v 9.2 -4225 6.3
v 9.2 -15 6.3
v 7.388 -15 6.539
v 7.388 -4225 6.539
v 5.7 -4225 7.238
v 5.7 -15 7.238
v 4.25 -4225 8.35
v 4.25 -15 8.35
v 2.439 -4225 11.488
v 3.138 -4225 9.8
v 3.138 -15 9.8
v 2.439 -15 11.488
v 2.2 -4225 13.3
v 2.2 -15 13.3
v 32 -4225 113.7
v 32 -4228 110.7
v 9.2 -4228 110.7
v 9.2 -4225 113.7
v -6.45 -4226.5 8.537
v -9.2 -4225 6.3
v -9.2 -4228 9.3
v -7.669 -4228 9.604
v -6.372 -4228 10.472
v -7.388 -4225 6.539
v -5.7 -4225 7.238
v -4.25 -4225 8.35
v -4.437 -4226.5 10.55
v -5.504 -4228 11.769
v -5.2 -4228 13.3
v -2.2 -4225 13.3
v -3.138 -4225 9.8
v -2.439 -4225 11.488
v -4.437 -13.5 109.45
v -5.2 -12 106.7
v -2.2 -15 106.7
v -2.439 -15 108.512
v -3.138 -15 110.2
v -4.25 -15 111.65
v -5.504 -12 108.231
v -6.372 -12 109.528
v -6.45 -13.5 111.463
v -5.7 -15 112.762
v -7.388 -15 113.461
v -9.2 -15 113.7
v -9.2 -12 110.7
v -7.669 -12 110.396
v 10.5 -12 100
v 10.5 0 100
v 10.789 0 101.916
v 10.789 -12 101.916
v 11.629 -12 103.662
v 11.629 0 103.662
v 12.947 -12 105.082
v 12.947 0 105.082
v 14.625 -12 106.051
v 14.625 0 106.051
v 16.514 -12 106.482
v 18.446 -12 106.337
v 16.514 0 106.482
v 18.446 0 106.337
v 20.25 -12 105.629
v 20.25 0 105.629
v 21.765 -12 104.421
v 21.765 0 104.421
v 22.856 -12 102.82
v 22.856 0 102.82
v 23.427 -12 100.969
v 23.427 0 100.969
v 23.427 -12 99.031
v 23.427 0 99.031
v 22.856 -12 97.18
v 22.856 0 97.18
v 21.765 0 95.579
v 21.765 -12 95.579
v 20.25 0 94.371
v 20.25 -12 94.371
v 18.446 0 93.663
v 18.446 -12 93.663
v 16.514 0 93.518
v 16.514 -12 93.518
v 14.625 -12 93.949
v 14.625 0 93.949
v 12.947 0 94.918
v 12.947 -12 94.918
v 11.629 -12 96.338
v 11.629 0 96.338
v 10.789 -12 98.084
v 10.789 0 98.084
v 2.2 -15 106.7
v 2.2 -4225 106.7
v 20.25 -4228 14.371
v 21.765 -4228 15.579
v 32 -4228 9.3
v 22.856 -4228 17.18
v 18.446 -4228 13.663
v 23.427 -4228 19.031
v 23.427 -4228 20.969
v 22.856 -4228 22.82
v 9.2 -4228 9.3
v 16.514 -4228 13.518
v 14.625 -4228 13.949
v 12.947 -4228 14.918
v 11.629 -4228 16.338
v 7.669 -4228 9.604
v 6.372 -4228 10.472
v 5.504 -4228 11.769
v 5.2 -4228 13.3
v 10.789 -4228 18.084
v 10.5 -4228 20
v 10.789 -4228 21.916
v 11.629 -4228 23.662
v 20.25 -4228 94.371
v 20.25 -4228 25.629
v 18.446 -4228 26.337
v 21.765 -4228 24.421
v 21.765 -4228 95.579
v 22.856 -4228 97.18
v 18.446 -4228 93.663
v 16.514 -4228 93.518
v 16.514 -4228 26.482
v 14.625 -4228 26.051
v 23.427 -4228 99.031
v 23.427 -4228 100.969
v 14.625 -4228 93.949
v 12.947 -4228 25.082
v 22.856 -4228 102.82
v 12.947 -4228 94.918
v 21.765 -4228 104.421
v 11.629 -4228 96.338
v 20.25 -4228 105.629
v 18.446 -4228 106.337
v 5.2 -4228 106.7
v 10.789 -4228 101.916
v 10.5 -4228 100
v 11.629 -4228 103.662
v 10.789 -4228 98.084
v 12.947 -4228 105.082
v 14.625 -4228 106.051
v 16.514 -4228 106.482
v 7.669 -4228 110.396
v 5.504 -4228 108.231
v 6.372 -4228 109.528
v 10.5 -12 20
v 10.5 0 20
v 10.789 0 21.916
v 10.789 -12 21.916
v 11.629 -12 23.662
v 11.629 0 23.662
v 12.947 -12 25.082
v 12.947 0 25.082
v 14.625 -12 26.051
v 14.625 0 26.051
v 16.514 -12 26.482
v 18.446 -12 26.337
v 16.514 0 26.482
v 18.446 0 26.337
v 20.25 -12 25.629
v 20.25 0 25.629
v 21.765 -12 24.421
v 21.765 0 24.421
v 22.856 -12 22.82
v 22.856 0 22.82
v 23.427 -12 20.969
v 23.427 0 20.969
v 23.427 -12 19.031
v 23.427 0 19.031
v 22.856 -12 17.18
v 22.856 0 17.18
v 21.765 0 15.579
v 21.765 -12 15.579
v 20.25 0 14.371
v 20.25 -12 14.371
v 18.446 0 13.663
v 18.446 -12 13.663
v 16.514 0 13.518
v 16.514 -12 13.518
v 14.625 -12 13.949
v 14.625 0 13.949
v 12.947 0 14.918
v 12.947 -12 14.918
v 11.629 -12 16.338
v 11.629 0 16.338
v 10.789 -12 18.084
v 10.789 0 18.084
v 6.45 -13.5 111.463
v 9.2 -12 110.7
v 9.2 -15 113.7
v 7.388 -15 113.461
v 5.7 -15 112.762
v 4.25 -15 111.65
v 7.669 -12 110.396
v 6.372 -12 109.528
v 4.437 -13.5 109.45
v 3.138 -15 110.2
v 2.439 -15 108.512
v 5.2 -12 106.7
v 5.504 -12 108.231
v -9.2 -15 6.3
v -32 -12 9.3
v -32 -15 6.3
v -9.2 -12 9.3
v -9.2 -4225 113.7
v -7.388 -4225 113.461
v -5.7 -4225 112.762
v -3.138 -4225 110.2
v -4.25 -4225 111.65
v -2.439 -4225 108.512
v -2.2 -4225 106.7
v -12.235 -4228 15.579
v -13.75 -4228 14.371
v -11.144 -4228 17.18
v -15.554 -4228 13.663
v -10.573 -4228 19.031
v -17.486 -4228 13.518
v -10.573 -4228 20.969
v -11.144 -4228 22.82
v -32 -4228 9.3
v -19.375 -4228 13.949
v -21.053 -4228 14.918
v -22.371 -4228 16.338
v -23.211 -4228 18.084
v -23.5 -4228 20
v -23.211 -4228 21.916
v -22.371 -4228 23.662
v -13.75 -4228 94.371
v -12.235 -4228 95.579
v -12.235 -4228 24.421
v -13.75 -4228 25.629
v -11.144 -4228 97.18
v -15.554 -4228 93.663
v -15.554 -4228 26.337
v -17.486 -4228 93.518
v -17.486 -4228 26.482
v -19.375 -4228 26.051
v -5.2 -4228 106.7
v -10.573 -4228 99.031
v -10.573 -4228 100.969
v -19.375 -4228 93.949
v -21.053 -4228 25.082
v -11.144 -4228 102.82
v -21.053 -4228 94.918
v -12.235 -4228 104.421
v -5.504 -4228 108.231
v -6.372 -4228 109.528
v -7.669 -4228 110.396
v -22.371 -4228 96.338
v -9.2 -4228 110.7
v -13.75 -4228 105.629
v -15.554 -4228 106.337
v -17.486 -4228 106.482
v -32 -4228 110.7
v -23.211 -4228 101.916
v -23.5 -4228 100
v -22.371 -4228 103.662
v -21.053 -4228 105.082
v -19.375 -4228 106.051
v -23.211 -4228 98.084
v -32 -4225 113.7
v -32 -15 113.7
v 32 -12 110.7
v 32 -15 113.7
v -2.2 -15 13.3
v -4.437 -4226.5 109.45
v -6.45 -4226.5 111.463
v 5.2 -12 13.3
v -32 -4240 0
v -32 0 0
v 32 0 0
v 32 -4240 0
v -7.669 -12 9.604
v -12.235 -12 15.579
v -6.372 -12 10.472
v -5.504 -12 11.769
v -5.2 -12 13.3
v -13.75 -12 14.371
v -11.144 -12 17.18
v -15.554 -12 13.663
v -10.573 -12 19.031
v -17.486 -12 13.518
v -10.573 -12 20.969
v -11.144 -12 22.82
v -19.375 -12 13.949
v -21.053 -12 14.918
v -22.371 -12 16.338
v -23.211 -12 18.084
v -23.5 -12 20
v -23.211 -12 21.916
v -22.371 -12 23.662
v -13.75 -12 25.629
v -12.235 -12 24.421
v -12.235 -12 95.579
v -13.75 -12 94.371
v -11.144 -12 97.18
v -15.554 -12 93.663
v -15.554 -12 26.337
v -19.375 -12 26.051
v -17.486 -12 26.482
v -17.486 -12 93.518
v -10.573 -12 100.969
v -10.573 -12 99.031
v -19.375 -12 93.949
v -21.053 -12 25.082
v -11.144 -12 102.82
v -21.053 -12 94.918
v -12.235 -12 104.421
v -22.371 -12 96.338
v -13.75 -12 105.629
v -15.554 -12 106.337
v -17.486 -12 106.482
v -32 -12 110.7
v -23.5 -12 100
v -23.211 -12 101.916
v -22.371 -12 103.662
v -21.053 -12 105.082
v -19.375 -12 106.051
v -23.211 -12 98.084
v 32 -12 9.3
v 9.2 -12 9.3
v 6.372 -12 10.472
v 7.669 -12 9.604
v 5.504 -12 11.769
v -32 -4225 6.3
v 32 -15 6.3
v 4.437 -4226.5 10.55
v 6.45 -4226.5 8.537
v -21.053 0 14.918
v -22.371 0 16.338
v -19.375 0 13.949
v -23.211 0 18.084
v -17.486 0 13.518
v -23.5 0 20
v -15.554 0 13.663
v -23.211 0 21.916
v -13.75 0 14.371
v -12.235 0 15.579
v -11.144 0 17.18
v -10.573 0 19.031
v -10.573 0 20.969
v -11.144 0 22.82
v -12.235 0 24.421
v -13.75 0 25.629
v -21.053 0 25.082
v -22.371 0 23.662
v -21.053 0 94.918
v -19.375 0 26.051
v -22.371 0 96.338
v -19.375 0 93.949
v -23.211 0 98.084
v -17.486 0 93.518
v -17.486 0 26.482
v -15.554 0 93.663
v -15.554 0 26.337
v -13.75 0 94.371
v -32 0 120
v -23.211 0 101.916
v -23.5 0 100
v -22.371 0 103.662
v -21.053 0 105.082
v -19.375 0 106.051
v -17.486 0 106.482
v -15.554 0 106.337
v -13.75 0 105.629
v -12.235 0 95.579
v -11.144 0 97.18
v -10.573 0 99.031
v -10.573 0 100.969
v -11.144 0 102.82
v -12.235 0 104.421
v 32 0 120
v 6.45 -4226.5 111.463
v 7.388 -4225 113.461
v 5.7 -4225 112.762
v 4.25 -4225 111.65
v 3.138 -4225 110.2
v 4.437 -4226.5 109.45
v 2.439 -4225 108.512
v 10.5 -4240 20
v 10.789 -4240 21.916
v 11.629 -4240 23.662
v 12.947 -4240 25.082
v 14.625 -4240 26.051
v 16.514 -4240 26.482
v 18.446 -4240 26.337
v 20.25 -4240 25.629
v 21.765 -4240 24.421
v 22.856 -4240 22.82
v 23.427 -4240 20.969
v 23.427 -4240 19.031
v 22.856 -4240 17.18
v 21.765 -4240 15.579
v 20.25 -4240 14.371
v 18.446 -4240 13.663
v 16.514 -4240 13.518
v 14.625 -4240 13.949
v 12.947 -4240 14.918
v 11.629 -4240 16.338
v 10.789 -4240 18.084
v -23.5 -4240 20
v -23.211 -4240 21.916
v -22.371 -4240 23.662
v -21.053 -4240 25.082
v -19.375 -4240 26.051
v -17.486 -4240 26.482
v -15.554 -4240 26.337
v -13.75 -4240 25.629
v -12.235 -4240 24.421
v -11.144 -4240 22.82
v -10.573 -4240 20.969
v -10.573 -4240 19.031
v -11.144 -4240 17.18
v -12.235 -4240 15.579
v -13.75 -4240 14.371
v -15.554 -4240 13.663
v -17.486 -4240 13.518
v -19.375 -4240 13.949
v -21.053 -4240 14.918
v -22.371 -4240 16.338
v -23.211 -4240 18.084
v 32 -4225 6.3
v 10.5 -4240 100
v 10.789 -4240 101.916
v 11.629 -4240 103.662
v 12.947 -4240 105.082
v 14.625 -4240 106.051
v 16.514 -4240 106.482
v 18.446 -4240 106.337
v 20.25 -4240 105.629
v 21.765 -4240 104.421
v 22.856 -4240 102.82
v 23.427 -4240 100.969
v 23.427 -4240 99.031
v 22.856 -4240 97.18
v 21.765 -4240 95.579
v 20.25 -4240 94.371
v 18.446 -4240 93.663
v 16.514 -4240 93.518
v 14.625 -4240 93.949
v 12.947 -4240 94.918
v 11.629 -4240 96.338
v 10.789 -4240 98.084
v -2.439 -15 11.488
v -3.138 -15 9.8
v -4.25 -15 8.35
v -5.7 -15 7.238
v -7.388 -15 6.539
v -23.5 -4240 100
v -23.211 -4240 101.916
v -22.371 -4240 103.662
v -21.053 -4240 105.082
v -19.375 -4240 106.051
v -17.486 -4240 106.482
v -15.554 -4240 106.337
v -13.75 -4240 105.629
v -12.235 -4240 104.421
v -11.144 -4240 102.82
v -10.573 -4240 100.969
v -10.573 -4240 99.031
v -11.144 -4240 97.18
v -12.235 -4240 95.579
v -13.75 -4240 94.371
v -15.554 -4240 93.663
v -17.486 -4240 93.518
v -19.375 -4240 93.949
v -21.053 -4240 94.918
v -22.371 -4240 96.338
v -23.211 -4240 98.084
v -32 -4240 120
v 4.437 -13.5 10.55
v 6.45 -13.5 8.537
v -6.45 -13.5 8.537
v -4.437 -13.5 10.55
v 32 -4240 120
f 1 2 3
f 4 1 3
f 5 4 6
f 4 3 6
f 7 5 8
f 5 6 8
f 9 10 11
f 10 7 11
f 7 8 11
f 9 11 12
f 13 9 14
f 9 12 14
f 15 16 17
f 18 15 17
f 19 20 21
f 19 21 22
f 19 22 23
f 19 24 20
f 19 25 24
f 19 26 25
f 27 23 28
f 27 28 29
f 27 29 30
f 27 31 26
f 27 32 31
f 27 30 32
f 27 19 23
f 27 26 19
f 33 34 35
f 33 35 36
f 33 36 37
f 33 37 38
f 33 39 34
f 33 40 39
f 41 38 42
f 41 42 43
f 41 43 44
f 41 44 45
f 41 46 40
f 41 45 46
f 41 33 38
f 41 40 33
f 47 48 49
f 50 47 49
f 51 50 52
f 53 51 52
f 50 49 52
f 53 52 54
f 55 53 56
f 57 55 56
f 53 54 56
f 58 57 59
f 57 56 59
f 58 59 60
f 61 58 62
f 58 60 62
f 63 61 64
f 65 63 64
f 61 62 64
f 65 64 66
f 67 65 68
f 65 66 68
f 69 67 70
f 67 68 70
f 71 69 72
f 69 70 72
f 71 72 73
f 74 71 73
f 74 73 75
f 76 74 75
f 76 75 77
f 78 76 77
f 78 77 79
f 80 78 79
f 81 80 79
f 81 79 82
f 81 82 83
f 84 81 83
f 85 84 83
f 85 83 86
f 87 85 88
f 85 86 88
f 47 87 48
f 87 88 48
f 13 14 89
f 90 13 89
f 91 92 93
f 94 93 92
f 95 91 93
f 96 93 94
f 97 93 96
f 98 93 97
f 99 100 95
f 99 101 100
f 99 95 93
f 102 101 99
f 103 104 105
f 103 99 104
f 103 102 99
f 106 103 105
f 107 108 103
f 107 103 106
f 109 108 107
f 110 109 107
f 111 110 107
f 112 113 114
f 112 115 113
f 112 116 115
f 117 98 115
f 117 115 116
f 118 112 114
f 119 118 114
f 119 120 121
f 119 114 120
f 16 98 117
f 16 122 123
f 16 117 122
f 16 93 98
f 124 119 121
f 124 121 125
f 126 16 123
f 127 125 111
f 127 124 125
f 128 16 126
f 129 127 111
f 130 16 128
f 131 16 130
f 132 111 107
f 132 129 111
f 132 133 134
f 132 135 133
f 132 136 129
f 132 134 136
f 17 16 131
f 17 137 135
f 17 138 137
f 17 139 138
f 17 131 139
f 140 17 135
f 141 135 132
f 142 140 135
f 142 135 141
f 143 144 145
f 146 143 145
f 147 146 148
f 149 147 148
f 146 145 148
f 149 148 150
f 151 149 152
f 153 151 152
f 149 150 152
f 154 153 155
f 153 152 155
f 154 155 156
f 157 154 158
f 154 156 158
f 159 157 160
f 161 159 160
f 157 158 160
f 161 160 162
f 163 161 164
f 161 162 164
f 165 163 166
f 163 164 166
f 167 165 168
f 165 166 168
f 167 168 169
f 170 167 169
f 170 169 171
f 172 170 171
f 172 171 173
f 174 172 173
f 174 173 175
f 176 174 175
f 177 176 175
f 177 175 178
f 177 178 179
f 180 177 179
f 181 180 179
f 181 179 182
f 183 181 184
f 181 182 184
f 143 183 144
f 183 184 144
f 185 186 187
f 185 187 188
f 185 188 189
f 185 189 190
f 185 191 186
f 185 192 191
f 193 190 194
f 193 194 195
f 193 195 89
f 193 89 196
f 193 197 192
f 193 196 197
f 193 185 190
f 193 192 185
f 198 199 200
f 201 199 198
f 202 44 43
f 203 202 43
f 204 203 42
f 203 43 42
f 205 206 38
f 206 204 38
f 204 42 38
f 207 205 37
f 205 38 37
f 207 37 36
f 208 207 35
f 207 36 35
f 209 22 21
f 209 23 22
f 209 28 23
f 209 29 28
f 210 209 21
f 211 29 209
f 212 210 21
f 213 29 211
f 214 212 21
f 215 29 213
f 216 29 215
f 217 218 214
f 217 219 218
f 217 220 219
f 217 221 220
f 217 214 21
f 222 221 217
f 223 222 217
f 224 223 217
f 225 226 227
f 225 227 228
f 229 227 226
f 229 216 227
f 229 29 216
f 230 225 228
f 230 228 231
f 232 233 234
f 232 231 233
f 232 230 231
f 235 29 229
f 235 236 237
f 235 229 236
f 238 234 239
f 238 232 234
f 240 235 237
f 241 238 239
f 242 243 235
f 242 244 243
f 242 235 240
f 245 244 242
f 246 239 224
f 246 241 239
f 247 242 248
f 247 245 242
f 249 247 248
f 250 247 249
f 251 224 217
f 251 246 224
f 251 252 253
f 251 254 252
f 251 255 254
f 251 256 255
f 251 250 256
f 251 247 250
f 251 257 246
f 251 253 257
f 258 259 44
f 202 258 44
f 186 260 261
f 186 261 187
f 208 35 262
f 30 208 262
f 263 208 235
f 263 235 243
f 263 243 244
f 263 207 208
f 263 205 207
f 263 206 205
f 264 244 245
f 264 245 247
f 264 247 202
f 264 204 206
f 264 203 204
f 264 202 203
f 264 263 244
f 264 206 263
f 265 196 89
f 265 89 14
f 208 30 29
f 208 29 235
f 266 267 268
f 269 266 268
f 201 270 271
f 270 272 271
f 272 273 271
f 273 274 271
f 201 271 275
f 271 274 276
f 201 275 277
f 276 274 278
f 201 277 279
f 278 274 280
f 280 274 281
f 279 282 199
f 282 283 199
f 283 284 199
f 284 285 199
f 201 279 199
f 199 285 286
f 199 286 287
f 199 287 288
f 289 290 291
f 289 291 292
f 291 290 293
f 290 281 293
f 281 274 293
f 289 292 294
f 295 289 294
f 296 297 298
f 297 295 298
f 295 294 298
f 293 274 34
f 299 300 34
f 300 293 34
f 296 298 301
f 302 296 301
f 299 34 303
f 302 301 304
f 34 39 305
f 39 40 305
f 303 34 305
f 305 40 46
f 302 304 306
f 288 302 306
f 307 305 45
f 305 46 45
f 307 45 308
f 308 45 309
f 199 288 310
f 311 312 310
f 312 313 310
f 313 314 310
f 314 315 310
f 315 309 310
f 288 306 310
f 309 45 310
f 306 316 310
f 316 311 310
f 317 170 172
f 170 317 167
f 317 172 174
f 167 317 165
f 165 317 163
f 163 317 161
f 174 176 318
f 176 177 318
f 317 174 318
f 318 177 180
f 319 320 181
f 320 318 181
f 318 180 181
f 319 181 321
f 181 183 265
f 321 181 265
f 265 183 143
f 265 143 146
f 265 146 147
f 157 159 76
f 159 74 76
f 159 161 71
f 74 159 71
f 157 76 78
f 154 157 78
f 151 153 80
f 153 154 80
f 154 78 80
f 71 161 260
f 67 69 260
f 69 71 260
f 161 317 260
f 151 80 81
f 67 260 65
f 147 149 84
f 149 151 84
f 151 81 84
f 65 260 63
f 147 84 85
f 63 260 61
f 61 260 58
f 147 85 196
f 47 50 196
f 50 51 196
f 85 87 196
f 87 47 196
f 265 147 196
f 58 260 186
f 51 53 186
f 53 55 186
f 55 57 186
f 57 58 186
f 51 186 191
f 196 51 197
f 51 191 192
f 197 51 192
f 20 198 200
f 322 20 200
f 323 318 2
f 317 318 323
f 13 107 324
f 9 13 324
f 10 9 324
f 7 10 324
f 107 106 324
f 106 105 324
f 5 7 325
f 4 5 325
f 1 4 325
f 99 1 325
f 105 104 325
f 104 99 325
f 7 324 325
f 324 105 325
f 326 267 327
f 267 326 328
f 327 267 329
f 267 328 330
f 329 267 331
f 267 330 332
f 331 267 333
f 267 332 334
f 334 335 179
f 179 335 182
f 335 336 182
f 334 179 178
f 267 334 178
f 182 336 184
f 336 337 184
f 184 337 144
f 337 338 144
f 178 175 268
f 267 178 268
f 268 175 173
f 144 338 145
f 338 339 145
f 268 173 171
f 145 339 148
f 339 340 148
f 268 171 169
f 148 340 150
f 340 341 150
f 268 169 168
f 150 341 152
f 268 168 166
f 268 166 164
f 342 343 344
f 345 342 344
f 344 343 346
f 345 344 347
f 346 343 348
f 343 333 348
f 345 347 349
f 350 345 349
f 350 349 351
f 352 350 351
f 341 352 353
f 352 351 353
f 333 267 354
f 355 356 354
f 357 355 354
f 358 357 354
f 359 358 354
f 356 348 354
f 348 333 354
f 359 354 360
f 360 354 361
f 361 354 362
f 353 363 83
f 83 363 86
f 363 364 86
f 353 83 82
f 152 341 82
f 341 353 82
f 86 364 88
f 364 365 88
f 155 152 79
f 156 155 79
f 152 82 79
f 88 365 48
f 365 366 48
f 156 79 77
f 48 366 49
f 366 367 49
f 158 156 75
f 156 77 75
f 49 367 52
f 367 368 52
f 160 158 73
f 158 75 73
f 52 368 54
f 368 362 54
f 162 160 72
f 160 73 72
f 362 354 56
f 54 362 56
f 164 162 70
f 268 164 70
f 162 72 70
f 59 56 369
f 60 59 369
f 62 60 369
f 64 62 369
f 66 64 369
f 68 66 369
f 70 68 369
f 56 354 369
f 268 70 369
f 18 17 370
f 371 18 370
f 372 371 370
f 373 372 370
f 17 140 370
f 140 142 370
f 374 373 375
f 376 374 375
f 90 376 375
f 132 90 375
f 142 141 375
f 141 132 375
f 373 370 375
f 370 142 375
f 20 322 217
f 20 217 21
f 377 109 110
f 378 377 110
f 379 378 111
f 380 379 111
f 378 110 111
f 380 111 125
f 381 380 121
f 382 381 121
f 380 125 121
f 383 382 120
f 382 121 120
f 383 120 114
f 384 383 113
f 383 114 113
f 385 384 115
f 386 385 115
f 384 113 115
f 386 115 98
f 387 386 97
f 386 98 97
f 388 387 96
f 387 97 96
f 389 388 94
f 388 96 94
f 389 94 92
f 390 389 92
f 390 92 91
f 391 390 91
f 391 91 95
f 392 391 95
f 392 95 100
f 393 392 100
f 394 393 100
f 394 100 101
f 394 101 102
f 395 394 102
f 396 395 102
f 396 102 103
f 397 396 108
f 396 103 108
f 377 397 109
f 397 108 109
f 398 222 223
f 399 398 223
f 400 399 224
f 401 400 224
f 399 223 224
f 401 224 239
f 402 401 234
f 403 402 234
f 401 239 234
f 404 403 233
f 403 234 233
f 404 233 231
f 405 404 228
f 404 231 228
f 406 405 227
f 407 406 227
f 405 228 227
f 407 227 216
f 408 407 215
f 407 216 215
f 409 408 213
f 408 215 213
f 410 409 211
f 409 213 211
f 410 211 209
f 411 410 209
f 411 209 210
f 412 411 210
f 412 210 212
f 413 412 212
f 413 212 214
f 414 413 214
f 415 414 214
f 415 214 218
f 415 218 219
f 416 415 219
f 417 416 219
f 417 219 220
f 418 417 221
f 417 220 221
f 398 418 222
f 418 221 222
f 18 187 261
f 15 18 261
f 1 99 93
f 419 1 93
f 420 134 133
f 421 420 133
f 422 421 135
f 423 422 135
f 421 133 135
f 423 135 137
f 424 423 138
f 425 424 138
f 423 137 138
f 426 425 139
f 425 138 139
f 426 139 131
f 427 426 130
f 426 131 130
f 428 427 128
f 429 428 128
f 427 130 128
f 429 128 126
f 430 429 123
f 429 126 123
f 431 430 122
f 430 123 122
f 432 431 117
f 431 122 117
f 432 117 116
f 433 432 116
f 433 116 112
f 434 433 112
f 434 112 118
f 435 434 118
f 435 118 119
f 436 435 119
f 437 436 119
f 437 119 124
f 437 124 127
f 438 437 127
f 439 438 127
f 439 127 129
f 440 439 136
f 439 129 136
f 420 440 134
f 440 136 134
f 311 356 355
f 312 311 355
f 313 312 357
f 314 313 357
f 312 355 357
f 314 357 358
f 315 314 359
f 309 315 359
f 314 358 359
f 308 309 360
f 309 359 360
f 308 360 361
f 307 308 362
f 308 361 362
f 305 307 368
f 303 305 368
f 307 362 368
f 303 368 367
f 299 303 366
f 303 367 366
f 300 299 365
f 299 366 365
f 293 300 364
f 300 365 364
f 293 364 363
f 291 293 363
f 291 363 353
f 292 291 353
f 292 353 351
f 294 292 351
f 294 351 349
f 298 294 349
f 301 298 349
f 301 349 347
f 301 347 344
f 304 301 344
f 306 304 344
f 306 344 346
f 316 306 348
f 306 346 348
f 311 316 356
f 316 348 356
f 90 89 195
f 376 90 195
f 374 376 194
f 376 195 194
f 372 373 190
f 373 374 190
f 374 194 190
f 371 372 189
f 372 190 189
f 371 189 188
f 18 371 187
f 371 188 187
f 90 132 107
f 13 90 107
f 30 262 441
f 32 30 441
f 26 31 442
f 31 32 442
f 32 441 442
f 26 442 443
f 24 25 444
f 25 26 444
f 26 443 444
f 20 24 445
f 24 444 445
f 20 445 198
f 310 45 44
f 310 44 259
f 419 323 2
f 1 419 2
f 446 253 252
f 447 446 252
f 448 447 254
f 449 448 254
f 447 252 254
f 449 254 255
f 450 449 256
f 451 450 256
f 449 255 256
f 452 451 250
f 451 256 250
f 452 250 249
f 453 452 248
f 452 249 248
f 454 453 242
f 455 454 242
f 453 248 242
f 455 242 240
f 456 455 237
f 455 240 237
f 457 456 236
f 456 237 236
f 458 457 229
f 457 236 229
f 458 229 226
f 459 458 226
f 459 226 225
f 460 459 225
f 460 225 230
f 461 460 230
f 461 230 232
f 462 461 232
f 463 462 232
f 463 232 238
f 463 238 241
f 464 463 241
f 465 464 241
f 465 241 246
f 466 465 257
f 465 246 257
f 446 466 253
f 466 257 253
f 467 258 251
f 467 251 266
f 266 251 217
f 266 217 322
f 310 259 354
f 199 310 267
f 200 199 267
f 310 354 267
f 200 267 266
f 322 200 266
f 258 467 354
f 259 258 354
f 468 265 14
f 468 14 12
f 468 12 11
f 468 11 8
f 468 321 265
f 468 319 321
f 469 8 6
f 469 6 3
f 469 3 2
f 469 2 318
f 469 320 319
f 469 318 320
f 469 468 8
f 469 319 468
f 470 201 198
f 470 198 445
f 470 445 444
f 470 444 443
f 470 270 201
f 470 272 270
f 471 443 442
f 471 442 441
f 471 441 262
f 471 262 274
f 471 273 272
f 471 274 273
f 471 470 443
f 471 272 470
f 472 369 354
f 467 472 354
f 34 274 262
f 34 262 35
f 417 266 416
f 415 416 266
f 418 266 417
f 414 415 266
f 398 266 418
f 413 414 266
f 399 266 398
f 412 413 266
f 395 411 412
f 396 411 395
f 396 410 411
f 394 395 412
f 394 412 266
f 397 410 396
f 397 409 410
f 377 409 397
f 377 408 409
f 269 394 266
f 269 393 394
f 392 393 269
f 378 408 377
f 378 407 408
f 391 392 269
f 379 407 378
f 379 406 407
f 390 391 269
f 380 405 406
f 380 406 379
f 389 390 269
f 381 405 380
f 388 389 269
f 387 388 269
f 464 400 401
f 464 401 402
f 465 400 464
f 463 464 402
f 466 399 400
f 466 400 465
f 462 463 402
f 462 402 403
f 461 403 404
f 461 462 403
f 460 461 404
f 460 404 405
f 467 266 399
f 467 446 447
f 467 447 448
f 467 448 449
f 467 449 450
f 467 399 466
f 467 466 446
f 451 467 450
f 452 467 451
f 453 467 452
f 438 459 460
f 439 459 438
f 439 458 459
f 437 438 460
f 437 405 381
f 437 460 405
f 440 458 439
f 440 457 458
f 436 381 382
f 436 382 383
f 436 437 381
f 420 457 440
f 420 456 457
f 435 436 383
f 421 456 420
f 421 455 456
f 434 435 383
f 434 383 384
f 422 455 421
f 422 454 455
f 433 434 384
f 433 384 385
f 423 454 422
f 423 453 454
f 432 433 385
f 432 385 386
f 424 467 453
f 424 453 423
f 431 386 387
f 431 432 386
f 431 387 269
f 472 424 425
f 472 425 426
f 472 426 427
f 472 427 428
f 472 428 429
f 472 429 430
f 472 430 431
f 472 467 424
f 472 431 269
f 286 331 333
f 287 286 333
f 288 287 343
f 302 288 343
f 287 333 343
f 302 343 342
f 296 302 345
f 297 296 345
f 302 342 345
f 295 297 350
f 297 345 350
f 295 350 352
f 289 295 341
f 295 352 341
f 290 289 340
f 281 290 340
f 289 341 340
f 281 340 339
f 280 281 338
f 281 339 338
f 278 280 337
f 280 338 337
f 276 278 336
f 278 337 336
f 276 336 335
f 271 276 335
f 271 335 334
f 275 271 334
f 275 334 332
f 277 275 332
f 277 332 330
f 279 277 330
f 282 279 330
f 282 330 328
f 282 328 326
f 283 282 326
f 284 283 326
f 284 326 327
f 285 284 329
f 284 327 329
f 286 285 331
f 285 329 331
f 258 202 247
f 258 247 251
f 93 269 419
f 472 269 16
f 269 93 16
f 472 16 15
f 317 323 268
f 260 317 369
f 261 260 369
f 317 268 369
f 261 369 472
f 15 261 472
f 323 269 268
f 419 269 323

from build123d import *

# Parameters (mm, degrees)
F2_DEPTH = 4240
F3_R     = 6.5
F4_DEPTH = 12
F5_SIZE  = 3
F6_SIZE  = 3
F7_START = -4228
F3_W     = 64
F3_H     = 120
F7_DEPTH = 12
F8_SIZE  = 3
F9_SIZE  = 3


with BuildPart() as f2:
    # F0 (on Front) → F2 (new body)
    with BuildSketch(Plane.XZ):
        with BuildLine():
            Line((-32, 6.3), (-32, 0))
            Line((-32, 0), (32, 0))
            Line((32, 0), (32, 6.3))
            Line((32, 6.3), (9.2, 6.3))
            ThreePointArc((9.2, 6.3), (4.2502525317, 8.3502525317), (2.2, 13.3))
            Line((2.2, 13.3), (2.2, 106.7))
            ThreePointArc((2.2, 106.7), (4.2502525317, 111.6497474683), (9.2, 113.7))
            Line((9.2, 113.7), (32, 113.7))
            Line((32, 113.7), (32, 120))
            Line((32, 120), (-32, 120))
            Line((-32, 120), (-32, 113.7))
            Line((-32, 113.7), (-9.2, 113.7))
            ThreePointArc((-9.2, 113.7), (-4.2502525317, 111.6497474683), (-2.2, 106.7))
            Line((-2.2, 106.7), (-2.2, 13.3))
            ThreePointArc((-2.2, 13.3), (-4.2502525317, 8.3502525317), (-9.2, 6.3))
            Line((-9.2, 6.3), (-32, 6.3))
        make_face()
    extrude(amount=F2_DEPTH)

    # F3 (on face) → F4 (join)
    with BuildSketch(Plane(origin=(0, 0, 0), x_dir=(-1, 0, 0), z_dir=(0, 1, 0))):
        with BuildLine():
            Line((9.2, 6.3), (32, 6.3))
            Line((32, 6.3), (32, 113.7))
            Line((32, 113.7), (9.2, 113.7))
            ThreePointArc((9.2, 113.7), (4.2502525317, 111.6497474683), (2.2, 106.7))
            Line((2.2, 106.7), (2.2, 13.3))
            ThreePointArc((2.2, 13.3), (4.2502525317, 8.3502525317), (9.2, 6.3))
        make_face()
        with Locations((17, 20)):
            Circle(F3_R, mode=Mode.SUBTRACT)
        with Locations((17, 100)):
            Circle(F3_R, mode=Mode.SUBTRACT)
        with BuildLine():
            Line((-32, 113.7), (-32, 6.3))
            Line((-32, 6.3), (-9.2, 6.3))
            ThreePointArc((-9.2, 6.3), (-4.2502525317, 8.3502525317), (-2.2, 13.3))
            Line((-2.2, 13.3), (-2.2, 106.7))
            ThreePointArc((-2.2, 106.7), (-4.2502525317, 111.6497474683), (-9.2, 113.7))
            Line((-9.2, 113.7), (-32, 113.7))
        make_face()
        with Locations((-17, 20)):
            Circle(F3_R, mode=Mode.SUBTRACT)
        with Locations((-17, 100)):
            Circle(F3_R, mode=Mode.SUBTRACT)
        with BuildLine():
            Line((-32, 6.3), (-32, 0))
            Line((-32, 0), (32, 0))
            Line((32, 0), (32, 6.3))
            Line((32, 6.3), (9.2, 6.3))
            ThreePointArc((9.2, 6.3), (4.2502525317, 8.3502525317), (2.2, 13.3))
            Line((2.2, 13.3), (2.2, 106.7))
            ThreePointArc((2.2, 106.7), (4.2502525317, 111.6497474683), (9.2, 113.7))
            Line((9.2, 113.7), (32, 113.7))
            Line((32, 113.7), (32, 120))
            Line((32, 120), (-32, 120))
            Line((-32, 120), (-32, 113.7))
            Line((-32, 113.7), (-9.2, 113.7))
            ThreePointArc((-9.2, 113.7), (-4.2502525317, 111.6497474683), (-2.2, 106.7))
            Line((-2.2, 106.7), (-2.2, 13.3))
            ThreePointArc((-2.2, 13.3), (-4.2502525317, 8.3502525317), (-9.2, 6.3))
            Line((-9.2, 6.3), (-32, 6.3))
        make_face()
    extrude(amount=-F4_DEPTH)

    # F5
    f5_edges = [f2.edges().sort_by_distance(p)[0] for p in [
        (20.6, -12, 113.7),
        (4.250253, -12, 111.649747),
        (2.2, -12, 60),
        (4.250253, -12, 8.350253),
        (20.6, -12, 6.3),
    ]]
    chamfer(f5_edges, length=F5_SIZE)

    # F6
    f6_edges = [f2.edges().sort_by_distance(p)[0] for p in [
        (-20.6, -12, 6.3),
        (-4.250253, -12, 8.350253),
        (-2.2, -12, 60),
        (-4.250253, -12, 111.649747),
        (-20.6, -12, 113.7),
    ]]
    chamfer(f6_edges, length=F6_SIZE)

    # F3 (on face) → F7 (join)
    with BuildSketch(Plane(origin=(0, 0, 0), x_dir=(-1, 0, 0), z_dir=(0, 1, 0)).offset(F7_START)):
        with Locations((0, 60)):
            Rectangle(F3_W, F3_H)
        with Locations((-17, 20)):
            Circle(F3_R, mode=Mode.SUBTRACT)
        with Locations((17, 20)):
            Circle(F3_R, mode=Mode.SUBTRACT)
        with Locations((-17, 100)):
            Circle(F3_R, mode=Mode.SUBTRACT)
        with Locations((17, 100)):
            Circle(F3_R, mode=Mode.SUBTRACT)
    extrude(amount=-F7_DEPTH)

    # F8
    f8_edges = [f2.edges().sort_by_distance(p)[0] for p in [
        (20.6, -4228, 113.7),
        (4.250253, -4228, 111.649747),
        (2.2, -4228, 60),
        (4.250253, -4228, 8.350253),
        (20.6, -4228, 6.3),
    ]]
    chamfer(f8_edges, length=F8_SIZE)

    # F9
    f9_edges = [f2.edges().sort_by_distance(p)[0] for p in [
        (-20.6, -4228, 113.7),
        (-4.250253, -4228, 111.649747),
        (-2.2, -4228, 60),
        (-4.250253, -4228, 8.350253),
        (-20.6, -4228, 6.3),
    ]]
    chamfer(f9_edges, length=F9_SIZE)


solid = f2.part
